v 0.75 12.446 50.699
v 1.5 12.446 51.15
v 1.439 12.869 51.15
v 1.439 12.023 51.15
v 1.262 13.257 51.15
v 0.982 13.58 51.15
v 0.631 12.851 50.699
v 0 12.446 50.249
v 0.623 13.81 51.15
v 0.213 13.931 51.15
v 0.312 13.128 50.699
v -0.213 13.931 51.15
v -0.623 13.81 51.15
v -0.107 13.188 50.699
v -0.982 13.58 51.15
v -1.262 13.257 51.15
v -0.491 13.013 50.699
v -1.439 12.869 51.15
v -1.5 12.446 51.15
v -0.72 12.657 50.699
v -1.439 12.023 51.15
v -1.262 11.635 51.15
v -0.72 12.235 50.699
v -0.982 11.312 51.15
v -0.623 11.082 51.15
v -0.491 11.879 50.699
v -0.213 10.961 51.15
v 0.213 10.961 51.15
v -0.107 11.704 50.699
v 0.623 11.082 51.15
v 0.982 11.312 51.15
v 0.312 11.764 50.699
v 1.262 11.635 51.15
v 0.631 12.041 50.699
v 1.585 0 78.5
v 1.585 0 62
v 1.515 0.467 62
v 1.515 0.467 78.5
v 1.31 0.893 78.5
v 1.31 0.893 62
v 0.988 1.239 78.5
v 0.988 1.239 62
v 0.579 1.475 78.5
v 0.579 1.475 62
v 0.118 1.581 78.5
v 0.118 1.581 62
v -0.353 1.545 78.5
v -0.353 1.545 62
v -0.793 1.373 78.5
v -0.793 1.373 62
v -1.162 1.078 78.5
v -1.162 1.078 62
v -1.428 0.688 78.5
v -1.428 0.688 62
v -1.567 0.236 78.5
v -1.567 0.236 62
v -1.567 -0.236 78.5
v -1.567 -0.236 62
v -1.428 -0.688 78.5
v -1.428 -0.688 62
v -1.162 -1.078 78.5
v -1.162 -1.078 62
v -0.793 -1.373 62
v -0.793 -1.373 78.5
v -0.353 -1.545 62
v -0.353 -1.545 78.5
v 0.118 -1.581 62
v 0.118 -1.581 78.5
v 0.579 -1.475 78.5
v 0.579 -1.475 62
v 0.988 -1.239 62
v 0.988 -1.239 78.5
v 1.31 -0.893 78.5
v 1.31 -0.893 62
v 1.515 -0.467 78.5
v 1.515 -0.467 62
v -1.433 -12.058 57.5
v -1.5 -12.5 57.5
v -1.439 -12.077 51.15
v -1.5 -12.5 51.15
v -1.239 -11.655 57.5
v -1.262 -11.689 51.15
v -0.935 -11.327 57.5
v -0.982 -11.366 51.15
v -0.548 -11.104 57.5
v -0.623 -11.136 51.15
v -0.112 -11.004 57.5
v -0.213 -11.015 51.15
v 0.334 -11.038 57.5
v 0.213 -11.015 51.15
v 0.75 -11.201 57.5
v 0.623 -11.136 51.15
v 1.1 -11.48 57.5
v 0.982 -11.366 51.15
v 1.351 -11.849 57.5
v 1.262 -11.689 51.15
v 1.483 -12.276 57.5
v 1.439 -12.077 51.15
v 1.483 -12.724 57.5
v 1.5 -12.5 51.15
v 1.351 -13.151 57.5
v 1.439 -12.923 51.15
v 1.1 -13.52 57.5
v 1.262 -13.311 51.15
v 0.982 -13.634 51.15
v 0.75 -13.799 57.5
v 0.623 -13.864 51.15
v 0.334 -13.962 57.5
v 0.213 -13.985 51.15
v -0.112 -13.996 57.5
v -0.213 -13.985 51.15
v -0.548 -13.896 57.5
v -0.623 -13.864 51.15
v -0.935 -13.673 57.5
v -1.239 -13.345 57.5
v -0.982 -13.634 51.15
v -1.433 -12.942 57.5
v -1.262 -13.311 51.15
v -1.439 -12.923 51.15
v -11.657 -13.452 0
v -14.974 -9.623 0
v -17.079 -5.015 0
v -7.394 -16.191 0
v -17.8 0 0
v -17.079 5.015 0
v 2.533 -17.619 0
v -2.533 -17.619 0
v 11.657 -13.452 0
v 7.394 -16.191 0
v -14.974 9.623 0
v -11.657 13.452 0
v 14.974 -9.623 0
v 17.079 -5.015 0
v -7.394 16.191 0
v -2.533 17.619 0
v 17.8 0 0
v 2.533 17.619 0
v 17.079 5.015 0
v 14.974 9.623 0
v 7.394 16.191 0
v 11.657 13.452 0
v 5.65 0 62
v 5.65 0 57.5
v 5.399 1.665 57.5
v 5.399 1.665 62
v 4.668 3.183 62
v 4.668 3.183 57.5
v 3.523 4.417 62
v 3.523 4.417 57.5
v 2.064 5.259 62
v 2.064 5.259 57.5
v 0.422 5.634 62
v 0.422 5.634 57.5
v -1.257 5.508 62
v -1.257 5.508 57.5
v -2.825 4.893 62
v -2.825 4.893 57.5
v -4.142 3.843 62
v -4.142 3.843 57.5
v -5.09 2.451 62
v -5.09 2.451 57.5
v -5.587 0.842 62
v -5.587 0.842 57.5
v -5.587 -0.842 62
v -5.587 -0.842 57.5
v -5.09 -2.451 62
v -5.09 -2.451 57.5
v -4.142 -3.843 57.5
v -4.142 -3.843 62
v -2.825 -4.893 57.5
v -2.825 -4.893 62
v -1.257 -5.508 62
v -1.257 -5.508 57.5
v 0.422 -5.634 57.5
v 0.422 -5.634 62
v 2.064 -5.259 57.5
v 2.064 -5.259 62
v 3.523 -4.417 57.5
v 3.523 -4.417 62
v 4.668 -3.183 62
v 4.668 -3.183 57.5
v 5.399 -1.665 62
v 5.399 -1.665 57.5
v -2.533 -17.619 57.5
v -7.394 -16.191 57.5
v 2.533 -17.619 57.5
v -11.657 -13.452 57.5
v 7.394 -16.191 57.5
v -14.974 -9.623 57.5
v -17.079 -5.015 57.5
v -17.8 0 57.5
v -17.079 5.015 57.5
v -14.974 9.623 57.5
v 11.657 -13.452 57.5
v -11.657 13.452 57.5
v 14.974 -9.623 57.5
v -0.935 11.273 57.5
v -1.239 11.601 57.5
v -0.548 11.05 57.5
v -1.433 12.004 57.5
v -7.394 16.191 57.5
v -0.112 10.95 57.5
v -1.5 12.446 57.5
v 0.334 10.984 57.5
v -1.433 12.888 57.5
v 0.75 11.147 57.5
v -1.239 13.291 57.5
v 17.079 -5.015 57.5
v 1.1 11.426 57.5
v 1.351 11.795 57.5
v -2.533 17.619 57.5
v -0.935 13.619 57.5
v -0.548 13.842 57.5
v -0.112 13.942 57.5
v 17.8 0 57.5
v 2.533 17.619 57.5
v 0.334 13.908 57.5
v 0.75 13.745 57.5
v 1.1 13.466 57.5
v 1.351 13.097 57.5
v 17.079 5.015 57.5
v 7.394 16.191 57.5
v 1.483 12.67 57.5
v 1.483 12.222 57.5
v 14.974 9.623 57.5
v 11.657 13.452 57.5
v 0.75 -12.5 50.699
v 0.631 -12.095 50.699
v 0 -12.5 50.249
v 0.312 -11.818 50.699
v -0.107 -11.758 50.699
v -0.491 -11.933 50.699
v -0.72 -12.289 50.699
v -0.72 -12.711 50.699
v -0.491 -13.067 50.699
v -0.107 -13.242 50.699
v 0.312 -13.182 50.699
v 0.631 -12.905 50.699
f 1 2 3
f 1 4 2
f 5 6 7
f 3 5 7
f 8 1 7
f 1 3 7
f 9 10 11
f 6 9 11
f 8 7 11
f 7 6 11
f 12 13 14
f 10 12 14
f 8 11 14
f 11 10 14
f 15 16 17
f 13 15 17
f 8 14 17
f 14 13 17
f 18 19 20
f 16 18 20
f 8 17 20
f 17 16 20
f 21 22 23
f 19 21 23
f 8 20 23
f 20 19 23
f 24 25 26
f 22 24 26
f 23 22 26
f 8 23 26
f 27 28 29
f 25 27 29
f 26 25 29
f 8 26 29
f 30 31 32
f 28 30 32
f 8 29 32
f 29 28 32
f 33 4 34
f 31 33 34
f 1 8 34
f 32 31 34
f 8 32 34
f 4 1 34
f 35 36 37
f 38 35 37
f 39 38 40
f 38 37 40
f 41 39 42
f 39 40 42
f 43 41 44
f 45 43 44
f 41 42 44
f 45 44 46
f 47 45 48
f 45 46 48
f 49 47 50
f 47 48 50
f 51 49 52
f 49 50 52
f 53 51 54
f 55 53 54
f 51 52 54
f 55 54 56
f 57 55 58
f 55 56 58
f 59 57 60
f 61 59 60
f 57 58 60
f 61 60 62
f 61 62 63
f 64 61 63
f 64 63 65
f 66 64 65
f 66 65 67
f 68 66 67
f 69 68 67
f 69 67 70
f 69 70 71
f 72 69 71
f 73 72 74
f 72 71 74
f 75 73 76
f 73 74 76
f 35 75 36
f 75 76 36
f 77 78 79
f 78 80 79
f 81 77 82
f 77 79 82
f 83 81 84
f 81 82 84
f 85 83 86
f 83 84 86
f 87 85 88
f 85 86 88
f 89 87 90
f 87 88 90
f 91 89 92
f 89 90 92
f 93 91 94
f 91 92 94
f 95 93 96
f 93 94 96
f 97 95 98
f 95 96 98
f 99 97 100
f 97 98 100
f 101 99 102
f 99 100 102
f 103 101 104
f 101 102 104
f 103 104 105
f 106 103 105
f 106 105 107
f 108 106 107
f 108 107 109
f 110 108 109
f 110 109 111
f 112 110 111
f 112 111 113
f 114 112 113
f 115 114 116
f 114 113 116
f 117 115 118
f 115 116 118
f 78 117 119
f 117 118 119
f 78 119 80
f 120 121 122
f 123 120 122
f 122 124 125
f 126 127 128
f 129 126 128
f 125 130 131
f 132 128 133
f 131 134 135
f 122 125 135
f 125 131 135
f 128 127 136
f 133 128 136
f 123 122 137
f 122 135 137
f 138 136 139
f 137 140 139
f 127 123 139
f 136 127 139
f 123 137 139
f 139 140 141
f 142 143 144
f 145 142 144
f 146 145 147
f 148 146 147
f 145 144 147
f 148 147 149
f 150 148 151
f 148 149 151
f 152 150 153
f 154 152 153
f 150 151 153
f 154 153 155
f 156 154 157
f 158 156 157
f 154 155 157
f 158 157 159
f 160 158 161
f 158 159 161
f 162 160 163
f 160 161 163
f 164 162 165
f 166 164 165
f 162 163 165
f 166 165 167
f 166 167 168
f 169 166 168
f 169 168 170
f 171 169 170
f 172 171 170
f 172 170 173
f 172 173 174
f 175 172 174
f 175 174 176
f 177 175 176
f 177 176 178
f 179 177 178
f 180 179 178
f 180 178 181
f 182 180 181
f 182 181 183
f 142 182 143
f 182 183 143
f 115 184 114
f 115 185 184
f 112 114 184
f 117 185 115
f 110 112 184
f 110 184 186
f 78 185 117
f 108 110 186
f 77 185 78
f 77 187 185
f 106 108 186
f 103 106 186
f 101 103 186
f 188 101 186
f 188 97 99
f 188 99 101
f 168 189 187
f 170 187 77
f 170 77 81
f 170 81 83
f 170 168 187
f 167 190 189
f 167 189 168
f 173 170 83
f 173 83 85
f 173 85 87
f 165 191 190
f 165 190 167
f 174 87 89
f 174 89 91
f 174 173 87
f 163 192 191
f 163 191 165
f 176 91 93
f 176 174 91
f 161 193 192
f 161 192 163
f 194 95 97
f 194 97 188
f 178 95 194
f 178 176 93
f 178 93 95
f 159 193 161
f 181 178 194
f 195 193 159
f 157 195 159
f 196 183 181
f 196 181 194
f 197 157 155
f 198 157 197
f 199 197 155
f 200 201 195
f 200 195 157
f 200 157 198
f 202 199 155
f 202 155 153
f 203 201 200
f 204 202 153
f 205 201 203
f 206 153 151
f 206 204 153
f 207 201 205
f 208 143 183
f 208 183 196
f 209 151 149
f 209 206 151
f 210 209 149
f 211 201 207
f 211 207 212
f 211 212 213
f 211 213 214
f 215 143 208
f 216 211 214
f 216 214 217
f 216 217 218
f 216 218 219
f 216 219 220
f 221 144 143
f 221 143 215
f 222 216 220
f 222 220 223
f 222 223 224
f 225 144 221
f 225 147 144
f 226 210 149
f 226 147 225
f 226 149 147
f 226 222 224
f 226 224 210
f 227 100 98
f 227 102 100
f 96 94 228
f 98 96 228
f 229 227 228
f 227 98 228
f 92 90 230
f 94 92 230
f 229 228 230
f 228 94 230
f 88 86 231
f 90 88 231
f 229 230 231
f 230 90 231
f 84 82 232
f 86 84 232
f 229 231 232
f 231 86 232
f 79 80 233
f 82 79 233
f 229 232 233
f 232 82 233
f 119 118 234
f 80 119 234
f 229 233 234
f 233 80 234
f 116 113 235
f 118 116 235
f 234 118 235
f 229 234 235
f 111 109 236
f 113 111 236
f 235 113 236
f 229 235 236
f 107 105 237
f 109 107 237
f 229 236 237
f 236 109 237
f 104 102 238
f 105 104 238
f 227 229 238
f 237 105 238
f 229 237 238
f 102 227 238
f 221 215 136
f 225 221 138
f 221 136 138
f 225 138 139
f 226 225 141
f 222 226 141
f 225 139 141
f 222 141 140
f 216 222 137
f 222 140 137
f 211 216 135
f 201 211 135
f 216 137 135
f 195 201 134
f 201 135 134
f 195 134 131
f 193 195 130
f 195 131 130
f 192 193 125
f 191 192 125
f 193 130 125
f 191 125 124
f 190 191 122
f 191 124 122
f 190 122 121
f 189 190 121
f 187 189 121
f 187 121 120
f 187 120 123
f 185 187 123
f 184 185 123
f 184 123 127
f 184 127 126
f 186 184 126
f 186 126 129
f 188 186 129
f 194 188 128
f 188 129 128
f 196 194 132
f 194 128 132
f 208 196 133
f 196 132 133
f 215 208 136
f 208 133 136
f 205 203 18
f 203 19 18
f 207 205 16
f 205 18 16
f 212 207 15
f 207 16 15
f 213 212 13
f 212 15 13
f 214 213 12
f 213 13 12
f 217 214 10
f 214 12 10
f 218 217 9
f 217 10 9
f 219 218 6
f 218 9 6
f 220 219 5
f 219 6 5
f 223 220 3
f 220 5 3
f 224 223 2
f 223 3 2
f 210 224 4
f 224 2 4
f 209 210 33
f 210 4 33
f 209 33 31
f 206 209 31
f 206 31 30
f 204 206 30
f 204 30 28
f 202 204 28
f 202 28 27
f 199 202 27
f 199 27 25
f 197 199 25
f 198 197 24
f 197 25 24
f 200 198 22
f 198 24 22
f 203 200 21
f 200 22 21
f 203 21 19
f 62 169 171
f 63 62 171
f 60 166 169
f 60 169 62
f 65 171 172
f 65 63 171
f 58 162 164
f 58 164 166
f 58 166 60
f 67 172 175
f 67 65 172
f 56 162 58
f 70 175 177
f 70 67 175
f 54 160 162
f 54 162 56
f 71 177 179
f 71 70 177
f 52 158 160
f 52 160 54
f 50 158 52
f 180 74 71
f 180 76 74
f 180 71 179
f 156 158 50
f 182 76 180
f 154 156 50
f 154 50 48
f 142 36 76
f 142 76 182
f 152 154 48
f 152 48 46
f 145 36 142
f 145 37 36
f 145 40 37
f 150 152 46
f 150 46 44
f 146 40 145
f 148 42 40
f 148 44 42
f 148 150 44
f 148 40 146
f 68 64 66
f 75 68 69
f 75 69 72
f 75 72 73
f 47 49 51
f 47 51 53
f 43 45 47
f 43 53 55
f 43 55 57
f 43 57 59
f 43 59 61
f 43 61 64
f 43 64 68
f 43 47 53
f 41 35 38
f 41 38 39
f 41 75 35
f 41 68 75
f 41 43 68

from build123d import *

# Parameters (mm, degrees)
SKETCH1_R                    = 17.8
BOSS_EXTRUDE1_DEPTH          = 57.5
SKETCH2_R                    = 5.65
BOSS_EXTRUDE2_DEPTH          = 4.5
SKETCH3_R                    = 1.585
BOSS_EXTRUDE3_DEPTH          = 16.5
F_3_0_3_DIAMETER_HOLE1_D     = 3
F_3_0_3_DIAMETER_HOLE1_DEPTH = 6.35
F_3_0_3_DIAMETER_HOLE1_TIP   = 0.901290929


with BuildPart() as part:
    # Sketch1 → Boss-Extrude1 (new body)
    with BuildSketch(Plane.XY):
        Circle(SKETCH1_R)
    extrude(amount=BOSS_EXTRUDE1_DEPTH)

    # Sketch2 → Boss-Extrude2 (add)
    with BuildSketch(Plane.XY.offset(57.5)):
        Circle(SKETCH2_R)
    extrude(amount=BOSS_EXTRUDE2_DEPTH)

    # Sketch3 → Boss-Extrude3 (add)
    with BuildSketch(Plane.XY.offset(62)):
        Circle(SKETCH3_R)
    extrude(amount=BOSS_EXTRUDE3_DEPTH)

    # Ø3.0 (3) Diameter Hole1
    with Locations(Plane.XY.offset(57.5)):
        with Locations((0, 12.446), (0, -12.5)):
            Hole(F_3_0_3_DIAMETER_HOLE1_D / 2, depth=F_3_0_3_DIAMETER_HOLE1_DEPTH)
            with Locations((0, 0, -(F_3_0_3_DIAMETER_HOLE1_DEPTH + F_3_0_3_DIAMETER_HOLE1_TIP / 2))):  # 118° drill point
                Cone(0, F_3_0_3_DIAMETER_HOLE1_D / 2, F_3_0_3_DIAMETER_HOLE1_TIP, mode=Mode.SUBTRACT)


solid = part.part
